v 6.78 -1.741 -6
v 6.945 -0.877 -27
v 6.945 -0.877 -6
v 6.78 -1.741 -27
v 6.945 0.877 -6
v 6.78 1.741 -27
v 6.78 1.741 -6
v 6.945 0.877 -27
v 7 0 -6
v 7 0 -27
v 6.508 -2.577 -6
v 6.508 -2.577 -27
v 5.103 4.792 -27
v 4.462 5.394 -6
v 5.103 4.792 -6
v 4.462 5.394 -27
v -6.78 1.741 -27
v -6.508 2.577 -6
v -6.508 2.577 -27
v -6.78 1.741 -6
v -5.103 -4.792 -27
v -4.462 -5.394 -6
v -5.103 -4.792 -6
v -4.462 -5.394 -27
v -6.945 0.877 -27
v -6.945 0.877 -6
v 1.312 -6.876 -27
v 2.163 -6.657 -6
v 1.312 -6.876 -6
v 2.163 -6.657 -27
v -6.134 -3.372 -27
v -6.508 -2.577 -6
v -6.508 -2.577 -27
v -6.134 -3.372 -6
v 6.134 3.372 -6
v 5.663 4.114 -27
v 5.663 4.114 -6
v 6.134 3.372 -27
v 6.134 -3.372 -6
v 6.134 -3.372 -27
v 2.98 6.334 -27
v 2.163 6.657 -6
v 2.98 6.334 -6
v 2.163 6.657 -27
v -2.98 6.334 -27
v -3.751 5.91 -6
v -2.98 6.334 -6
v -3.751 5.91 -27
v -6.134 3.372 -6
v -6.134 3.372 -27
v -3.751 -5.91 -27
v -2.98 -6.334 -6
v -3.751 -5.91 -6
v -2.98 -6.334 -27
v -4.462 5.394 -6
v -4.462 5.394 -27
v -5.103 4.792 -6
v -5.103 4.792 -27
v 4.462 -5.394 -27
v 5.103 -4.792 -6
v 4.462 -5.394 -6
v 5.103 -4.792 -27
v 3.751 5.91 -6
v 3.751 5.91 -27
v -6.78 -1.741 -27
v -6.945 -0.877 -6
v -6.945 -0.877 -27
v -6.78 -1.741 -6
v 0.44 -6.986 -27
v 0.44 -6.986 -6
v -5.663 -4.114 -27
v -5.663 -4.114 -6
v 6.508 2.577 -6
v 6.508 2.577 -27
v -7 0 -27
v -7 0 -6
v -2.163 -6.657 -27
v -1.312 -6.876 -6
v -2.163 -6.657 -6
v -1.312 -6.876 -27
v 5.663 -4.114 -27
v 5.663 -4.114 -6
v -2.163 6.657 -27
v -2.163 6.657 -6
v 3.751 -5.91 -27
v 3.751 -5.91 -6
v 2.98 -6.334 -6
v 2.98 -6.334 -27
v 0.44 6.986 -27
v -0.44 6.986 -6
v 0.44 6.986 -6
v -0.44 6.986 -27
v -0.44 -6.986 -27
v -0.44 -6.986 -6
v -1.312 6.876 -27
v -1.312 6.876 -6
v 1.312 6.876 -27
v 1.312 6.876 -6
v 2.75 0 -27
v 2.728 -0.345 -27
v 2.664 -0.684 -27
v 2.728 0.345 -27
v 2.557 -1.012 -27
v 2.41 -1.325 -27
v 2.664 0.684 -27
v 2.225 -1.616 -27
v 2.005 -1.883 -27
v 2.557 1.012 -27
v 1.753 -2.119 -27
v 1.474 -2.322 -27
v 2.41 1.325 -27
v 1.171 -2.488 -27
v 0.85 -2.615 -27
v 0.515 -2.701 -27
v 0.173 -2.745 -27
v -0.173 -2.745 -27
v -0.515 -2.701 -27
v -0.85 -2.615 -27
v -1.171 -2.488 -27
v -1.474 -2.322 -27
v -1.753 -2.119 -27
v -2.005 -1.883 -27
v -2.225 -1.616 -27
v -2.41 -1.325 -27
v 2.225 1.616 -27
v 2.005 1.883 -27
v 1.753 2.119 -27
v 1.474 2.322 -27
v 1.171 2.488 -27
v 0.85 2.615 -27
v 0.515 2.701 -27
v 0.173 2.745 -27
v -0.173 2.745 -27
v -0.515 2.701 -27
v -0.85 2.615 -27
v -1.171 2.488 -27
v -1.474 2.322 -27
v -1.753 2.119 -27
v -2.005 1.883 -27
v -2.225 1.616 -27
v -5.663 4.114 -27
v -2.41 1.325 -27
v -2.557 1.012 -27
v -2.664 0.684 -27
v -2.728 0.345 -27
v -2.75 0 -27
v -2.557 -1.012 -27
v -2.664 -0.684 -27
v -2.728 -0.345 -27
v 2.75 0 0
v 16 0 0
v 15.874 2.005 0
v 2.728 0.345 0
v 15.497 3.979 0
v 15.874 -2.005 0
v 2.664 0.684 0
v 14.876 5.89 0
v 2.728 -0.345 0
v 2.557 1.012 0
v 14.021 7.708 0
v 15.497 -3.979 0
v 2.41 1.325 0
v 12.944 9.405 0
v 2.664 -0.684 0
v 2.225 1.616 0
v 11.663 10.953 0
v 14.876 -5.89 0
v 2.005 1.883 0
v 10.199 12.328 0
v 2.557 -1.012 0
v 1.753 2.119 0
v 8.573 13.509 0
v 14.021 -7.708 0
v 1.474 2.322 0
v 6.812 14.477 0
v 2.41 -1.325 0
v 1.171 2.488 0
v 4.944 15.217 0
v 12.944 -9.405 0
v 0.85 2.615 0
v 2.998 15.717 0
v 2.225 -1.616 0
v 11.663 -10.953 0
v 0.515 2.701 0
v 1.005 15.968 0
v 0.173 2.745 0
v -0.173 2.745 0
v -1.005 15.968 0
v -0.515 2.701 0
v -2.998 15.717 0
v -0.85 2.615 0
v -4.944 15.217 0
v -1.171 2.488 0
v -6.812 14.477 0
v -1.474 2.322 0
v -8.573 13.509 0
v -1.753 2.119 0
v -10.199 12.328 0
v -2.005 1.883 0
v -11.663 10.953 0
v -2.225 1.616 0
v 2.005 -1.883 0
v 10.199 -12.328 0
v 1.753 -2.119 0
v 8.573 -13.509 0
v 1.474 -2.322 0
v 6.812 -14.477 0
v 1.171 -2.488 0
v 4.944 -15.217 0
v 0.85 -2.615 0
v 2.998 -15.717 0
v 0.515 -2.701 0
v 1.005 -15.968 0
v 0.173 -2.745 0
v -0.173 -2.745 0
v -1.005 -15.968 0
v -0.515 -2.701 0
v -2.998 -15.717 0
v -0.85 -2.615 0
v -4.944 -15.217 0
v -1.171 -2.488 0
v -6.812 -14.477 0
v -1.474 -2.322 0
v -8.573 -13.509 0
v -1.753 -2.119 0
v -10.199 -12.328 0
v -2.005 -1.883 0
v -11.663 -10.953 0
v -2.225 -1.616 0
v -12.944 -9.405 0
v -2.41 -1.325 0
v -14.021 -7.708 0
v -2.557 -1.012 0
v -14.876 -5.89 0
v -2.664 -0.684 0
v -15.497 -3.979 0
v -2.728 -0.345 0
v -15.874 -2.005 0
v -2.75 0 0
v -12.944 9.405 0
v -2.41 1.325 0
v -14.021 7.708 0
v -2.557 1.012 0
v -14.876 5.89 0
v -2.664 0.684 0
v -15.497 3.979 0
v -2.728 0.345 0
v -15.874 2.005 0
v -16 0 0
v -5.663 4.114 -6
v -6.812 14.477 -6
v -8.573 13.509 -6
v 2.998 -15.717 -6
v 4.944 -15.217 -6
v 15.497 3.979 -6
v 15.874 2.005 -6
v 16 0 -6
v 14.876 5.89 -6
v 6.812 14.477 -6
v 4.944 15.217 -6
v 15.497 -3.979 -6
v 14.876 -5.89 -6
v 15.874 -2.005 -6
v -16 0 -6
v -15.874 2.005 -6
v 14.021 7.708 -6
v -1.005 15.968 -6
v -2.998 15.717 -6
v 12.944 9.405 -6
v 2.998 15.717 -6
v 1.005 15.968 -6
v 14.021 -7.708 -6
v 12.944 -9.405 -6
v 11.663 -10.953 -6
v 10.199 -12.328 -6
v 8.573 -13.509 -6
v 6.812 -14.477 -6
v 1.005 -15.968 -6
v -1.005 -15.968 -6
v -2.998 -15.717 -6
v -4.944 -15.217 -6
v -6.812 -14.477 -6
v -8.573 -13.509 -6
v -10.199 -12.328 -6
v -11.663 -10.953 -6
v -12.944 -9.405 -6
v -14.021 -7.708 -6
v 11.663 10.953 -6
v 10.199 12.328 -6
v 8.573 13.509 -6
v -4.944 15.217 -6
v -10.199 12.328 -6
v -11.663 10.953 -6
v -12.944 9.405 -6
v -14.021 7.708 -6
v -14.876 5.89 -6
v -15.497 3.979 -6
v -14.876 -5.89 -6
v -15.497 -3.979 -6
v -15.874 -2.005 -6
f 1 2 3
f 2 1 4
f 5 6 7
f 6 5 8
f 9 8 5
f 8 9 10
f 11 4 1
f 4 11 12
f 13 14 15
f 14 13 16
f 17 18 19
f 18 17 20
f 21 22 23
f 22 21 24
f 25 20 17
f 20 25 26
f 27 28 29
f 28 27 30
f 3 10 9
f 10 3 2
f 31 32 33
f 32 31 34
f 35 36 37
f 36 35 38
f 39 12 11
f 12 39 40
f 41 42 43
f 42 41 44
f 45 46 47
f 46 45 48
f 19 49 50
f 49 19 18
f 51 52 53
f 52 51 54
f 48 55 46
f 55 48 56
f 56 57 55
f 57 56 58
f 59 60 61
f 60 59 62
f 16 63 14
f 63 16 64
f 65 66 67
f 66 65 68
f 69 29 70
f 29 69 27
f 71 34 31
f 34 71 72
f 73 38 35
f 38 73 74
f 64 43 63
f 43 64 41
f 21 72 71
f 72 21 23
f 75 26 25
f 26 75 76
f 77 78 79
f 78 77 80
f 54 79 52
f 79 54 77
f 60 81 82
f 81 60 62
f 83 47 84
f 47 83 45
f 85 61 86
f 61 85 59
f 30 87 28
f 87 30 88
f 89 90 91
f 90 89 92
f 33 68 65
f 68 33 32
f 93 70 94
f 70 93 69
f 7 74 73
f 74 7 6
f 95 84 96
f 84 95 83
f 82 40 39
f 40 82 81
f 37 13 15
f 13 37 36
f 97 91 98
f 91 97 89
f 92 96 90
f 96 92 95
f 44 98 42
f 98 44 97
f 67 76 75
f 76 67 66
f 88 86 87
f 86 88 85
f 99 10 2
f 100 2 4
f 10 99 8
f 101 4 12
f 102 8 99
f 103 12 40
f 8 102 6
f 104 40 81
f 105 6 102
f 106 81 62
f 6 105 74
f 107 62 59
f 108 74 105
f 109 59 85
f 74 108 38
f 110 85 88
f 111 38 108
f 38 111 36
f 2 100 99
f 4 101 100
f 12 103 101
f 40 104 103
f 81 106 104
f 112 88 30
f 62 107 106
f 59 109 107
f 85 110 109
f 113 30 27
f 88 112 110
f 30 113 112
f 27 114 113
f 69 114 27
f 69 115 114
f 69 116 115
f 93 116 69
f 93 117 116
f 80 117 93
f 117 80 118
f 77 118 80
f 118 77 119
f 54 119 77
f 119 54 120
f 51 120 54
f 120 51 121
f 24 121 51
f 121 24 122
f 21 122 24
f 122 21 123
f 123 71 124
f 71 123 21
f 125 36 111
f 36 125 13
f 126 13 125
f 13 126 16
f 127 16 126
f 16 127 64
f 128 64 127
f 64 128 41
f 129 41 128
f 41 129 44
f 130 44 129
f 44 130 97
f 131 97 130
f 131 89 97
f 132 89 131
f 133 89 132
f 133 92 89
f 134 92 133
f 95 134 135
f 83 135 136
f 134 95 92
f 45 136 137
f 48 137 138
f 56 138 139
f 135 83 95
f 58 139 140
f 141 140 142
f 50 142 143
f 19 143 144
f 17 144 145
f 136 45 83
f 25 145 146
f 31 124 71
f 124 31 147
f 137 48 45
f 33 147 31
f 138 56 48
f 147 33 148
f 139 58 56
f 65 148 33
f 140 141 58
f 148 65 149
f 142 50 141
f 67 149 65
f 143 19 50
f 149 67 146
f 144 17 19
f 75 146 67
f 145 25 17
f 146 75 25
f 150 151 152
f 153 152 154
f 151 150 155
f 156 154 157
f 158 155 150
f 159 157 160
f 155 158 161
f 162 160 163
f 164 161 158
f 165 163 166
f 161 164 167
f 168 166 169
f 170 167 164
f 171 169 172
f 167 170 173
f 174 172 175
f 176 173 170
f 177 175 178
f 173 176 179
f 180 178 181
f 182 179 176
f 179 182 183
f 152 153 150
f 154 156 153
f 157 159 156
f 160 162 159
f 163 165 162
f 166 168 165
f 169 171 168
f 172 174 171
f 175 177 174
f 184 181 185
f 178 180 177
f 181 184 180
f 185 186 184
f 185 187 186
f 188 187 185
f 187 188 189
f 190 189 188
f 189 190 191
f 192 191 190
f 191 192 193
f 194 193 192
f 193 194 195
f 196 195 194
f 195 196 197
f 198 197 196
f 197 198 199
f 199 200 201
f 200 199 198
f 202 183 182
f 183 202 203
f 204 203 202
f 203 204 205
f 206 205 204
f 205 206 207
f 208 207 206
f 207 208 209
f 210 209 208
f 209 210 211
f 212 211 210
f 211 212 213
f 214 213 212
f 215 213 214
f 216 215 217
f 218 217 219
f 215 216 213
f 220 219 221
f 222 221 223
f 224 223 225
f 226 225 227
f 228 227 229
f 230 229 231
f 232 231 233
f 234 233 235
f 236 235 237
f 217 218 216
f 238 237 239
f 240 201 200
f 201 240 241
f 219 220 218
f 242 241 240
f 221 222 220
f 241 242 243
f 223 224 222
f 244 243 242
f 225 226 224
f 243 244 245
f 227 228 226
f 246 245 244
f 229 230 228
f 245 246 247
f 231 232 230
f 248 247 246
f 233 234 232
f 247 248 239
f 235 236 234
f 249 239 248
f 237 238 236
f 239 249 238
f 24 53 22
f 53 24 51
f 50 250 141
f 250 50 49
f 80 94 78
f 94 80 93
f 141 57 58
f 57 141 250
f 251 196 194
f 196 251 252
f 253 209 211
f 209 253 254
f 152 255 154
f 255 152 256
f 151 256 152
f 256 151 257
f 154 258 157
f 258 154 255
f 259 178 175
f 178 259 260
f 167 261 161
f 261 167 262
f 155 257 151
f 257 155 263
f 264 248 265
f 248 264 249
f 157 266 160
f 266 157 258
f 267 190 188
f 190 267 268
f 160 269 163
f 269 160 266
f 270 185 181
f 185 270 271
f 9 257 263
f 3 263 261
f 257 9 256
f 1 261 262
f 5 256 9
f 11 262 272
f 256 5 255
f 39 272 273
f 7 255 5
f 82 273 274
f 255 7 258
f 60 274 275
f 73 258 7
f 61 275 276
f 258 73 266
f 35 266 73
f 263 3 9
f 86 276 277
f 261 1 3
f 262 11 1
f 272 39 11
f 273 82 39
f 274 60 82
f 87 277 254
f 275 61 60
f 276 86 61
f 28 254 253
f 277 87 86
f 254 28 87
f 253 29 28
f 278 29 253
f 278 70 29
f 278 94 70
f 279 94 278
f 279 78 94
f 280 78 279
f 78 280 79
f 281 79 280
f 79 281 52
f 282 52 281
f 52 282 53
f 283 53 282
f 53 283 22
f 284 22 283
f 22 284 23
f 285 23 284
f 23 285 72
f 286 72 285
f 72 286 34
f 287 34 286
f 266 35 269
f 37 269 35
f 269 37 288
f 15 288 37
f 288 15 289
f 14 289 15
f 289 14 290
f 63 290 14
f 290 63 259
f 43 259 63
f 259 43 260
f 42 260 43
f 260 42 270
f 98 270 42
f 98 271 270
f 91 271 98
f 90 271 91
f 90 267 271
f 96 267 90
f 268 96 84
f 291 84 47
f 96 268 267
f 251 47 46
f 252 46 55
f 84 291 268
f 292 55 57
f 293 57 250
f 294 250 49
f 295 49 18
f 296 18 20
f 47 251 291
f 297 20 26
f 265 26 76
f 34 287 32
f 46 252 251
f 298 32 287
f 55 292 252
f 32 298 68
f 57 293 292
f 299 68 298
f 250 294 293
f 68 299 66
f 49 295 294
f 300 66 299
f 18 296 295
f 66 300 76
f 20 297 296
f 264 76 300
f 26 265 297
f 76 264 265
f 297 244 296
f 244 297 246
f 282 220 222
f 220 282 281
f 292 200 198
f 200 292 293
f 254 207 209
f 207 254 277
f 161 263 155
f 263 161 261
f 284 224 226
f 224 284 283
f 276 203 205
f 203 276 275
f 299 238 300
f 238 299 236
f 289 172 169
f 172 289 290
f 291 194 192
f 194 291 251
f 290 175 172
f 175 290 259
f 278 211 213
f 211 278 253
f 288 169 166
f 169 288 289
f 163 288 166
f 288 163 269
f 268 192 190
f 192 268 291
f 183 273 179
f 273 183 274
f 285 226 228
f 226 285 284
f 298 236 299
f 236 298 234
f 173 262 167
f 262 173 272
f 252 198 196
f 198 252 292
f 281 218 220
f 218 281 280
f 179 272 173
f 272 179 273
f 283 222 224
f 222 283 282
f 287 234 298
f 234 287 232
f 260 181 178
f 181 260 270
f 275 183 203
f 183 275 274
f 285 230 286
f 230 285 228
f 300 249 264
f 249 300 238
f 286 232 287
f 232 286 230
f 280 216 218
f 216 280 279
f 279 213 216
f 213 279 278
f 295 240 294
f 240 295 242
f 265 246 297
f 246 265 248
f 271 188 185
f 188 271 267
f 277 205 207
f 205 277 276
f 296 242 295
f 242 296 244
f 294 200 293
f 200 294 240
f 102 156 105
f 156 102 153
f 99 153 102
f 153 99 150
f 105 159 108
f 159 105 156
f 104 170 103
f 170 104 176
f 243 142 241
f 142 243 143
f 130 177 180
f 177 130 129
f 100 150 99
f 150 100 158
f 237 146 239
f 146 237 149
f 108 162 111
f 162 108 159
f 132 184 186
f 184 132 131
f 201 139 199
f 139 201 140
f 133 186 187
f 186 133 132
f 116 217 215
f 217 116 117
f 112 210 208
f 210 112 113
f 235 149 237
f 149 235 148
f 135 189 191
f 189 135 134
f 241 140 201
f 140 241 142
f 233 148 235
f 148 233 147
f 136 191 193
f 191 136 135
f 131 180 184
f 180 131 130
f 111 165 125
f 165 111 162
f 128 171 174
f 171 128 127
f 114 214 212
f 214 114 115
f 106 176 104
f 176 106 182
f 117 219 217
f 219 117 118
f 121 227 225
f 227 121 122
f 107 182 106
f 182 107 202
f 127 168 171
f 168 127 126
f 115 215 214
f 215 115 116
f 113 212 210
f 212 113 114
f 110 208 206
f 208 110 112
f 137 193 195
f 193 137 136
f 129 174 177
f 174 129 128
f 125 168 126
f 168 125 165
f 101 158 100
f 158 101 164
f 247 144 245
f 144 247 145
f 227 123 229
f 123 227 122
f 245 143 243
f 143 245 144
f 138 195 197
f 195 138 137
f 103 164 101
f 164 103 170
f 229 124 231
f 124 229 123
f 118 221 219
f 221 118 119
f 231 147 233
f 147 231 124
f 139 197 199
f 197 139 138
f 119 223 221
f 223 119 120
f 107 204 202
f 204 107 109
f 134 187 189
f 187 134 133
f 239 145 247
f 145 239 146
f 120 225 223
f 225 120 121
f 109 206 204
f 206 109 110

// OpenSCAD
$fn = 50;


difference() {
	union() {
		translate(v = [0, 0, -27.0000000000]) {
			cylinder(h = 27, r = 7.0000000000);
		}
		translate(v = [0, 0, -6.0000000000]) {
			cylinder(h = 6, r = 16.0000000000);
		}
	}
	union() {
		#translate(v = [0, 0, -27]) {
			cylinder(h = 27, r = 2.7500000000);
		}
	}
}
